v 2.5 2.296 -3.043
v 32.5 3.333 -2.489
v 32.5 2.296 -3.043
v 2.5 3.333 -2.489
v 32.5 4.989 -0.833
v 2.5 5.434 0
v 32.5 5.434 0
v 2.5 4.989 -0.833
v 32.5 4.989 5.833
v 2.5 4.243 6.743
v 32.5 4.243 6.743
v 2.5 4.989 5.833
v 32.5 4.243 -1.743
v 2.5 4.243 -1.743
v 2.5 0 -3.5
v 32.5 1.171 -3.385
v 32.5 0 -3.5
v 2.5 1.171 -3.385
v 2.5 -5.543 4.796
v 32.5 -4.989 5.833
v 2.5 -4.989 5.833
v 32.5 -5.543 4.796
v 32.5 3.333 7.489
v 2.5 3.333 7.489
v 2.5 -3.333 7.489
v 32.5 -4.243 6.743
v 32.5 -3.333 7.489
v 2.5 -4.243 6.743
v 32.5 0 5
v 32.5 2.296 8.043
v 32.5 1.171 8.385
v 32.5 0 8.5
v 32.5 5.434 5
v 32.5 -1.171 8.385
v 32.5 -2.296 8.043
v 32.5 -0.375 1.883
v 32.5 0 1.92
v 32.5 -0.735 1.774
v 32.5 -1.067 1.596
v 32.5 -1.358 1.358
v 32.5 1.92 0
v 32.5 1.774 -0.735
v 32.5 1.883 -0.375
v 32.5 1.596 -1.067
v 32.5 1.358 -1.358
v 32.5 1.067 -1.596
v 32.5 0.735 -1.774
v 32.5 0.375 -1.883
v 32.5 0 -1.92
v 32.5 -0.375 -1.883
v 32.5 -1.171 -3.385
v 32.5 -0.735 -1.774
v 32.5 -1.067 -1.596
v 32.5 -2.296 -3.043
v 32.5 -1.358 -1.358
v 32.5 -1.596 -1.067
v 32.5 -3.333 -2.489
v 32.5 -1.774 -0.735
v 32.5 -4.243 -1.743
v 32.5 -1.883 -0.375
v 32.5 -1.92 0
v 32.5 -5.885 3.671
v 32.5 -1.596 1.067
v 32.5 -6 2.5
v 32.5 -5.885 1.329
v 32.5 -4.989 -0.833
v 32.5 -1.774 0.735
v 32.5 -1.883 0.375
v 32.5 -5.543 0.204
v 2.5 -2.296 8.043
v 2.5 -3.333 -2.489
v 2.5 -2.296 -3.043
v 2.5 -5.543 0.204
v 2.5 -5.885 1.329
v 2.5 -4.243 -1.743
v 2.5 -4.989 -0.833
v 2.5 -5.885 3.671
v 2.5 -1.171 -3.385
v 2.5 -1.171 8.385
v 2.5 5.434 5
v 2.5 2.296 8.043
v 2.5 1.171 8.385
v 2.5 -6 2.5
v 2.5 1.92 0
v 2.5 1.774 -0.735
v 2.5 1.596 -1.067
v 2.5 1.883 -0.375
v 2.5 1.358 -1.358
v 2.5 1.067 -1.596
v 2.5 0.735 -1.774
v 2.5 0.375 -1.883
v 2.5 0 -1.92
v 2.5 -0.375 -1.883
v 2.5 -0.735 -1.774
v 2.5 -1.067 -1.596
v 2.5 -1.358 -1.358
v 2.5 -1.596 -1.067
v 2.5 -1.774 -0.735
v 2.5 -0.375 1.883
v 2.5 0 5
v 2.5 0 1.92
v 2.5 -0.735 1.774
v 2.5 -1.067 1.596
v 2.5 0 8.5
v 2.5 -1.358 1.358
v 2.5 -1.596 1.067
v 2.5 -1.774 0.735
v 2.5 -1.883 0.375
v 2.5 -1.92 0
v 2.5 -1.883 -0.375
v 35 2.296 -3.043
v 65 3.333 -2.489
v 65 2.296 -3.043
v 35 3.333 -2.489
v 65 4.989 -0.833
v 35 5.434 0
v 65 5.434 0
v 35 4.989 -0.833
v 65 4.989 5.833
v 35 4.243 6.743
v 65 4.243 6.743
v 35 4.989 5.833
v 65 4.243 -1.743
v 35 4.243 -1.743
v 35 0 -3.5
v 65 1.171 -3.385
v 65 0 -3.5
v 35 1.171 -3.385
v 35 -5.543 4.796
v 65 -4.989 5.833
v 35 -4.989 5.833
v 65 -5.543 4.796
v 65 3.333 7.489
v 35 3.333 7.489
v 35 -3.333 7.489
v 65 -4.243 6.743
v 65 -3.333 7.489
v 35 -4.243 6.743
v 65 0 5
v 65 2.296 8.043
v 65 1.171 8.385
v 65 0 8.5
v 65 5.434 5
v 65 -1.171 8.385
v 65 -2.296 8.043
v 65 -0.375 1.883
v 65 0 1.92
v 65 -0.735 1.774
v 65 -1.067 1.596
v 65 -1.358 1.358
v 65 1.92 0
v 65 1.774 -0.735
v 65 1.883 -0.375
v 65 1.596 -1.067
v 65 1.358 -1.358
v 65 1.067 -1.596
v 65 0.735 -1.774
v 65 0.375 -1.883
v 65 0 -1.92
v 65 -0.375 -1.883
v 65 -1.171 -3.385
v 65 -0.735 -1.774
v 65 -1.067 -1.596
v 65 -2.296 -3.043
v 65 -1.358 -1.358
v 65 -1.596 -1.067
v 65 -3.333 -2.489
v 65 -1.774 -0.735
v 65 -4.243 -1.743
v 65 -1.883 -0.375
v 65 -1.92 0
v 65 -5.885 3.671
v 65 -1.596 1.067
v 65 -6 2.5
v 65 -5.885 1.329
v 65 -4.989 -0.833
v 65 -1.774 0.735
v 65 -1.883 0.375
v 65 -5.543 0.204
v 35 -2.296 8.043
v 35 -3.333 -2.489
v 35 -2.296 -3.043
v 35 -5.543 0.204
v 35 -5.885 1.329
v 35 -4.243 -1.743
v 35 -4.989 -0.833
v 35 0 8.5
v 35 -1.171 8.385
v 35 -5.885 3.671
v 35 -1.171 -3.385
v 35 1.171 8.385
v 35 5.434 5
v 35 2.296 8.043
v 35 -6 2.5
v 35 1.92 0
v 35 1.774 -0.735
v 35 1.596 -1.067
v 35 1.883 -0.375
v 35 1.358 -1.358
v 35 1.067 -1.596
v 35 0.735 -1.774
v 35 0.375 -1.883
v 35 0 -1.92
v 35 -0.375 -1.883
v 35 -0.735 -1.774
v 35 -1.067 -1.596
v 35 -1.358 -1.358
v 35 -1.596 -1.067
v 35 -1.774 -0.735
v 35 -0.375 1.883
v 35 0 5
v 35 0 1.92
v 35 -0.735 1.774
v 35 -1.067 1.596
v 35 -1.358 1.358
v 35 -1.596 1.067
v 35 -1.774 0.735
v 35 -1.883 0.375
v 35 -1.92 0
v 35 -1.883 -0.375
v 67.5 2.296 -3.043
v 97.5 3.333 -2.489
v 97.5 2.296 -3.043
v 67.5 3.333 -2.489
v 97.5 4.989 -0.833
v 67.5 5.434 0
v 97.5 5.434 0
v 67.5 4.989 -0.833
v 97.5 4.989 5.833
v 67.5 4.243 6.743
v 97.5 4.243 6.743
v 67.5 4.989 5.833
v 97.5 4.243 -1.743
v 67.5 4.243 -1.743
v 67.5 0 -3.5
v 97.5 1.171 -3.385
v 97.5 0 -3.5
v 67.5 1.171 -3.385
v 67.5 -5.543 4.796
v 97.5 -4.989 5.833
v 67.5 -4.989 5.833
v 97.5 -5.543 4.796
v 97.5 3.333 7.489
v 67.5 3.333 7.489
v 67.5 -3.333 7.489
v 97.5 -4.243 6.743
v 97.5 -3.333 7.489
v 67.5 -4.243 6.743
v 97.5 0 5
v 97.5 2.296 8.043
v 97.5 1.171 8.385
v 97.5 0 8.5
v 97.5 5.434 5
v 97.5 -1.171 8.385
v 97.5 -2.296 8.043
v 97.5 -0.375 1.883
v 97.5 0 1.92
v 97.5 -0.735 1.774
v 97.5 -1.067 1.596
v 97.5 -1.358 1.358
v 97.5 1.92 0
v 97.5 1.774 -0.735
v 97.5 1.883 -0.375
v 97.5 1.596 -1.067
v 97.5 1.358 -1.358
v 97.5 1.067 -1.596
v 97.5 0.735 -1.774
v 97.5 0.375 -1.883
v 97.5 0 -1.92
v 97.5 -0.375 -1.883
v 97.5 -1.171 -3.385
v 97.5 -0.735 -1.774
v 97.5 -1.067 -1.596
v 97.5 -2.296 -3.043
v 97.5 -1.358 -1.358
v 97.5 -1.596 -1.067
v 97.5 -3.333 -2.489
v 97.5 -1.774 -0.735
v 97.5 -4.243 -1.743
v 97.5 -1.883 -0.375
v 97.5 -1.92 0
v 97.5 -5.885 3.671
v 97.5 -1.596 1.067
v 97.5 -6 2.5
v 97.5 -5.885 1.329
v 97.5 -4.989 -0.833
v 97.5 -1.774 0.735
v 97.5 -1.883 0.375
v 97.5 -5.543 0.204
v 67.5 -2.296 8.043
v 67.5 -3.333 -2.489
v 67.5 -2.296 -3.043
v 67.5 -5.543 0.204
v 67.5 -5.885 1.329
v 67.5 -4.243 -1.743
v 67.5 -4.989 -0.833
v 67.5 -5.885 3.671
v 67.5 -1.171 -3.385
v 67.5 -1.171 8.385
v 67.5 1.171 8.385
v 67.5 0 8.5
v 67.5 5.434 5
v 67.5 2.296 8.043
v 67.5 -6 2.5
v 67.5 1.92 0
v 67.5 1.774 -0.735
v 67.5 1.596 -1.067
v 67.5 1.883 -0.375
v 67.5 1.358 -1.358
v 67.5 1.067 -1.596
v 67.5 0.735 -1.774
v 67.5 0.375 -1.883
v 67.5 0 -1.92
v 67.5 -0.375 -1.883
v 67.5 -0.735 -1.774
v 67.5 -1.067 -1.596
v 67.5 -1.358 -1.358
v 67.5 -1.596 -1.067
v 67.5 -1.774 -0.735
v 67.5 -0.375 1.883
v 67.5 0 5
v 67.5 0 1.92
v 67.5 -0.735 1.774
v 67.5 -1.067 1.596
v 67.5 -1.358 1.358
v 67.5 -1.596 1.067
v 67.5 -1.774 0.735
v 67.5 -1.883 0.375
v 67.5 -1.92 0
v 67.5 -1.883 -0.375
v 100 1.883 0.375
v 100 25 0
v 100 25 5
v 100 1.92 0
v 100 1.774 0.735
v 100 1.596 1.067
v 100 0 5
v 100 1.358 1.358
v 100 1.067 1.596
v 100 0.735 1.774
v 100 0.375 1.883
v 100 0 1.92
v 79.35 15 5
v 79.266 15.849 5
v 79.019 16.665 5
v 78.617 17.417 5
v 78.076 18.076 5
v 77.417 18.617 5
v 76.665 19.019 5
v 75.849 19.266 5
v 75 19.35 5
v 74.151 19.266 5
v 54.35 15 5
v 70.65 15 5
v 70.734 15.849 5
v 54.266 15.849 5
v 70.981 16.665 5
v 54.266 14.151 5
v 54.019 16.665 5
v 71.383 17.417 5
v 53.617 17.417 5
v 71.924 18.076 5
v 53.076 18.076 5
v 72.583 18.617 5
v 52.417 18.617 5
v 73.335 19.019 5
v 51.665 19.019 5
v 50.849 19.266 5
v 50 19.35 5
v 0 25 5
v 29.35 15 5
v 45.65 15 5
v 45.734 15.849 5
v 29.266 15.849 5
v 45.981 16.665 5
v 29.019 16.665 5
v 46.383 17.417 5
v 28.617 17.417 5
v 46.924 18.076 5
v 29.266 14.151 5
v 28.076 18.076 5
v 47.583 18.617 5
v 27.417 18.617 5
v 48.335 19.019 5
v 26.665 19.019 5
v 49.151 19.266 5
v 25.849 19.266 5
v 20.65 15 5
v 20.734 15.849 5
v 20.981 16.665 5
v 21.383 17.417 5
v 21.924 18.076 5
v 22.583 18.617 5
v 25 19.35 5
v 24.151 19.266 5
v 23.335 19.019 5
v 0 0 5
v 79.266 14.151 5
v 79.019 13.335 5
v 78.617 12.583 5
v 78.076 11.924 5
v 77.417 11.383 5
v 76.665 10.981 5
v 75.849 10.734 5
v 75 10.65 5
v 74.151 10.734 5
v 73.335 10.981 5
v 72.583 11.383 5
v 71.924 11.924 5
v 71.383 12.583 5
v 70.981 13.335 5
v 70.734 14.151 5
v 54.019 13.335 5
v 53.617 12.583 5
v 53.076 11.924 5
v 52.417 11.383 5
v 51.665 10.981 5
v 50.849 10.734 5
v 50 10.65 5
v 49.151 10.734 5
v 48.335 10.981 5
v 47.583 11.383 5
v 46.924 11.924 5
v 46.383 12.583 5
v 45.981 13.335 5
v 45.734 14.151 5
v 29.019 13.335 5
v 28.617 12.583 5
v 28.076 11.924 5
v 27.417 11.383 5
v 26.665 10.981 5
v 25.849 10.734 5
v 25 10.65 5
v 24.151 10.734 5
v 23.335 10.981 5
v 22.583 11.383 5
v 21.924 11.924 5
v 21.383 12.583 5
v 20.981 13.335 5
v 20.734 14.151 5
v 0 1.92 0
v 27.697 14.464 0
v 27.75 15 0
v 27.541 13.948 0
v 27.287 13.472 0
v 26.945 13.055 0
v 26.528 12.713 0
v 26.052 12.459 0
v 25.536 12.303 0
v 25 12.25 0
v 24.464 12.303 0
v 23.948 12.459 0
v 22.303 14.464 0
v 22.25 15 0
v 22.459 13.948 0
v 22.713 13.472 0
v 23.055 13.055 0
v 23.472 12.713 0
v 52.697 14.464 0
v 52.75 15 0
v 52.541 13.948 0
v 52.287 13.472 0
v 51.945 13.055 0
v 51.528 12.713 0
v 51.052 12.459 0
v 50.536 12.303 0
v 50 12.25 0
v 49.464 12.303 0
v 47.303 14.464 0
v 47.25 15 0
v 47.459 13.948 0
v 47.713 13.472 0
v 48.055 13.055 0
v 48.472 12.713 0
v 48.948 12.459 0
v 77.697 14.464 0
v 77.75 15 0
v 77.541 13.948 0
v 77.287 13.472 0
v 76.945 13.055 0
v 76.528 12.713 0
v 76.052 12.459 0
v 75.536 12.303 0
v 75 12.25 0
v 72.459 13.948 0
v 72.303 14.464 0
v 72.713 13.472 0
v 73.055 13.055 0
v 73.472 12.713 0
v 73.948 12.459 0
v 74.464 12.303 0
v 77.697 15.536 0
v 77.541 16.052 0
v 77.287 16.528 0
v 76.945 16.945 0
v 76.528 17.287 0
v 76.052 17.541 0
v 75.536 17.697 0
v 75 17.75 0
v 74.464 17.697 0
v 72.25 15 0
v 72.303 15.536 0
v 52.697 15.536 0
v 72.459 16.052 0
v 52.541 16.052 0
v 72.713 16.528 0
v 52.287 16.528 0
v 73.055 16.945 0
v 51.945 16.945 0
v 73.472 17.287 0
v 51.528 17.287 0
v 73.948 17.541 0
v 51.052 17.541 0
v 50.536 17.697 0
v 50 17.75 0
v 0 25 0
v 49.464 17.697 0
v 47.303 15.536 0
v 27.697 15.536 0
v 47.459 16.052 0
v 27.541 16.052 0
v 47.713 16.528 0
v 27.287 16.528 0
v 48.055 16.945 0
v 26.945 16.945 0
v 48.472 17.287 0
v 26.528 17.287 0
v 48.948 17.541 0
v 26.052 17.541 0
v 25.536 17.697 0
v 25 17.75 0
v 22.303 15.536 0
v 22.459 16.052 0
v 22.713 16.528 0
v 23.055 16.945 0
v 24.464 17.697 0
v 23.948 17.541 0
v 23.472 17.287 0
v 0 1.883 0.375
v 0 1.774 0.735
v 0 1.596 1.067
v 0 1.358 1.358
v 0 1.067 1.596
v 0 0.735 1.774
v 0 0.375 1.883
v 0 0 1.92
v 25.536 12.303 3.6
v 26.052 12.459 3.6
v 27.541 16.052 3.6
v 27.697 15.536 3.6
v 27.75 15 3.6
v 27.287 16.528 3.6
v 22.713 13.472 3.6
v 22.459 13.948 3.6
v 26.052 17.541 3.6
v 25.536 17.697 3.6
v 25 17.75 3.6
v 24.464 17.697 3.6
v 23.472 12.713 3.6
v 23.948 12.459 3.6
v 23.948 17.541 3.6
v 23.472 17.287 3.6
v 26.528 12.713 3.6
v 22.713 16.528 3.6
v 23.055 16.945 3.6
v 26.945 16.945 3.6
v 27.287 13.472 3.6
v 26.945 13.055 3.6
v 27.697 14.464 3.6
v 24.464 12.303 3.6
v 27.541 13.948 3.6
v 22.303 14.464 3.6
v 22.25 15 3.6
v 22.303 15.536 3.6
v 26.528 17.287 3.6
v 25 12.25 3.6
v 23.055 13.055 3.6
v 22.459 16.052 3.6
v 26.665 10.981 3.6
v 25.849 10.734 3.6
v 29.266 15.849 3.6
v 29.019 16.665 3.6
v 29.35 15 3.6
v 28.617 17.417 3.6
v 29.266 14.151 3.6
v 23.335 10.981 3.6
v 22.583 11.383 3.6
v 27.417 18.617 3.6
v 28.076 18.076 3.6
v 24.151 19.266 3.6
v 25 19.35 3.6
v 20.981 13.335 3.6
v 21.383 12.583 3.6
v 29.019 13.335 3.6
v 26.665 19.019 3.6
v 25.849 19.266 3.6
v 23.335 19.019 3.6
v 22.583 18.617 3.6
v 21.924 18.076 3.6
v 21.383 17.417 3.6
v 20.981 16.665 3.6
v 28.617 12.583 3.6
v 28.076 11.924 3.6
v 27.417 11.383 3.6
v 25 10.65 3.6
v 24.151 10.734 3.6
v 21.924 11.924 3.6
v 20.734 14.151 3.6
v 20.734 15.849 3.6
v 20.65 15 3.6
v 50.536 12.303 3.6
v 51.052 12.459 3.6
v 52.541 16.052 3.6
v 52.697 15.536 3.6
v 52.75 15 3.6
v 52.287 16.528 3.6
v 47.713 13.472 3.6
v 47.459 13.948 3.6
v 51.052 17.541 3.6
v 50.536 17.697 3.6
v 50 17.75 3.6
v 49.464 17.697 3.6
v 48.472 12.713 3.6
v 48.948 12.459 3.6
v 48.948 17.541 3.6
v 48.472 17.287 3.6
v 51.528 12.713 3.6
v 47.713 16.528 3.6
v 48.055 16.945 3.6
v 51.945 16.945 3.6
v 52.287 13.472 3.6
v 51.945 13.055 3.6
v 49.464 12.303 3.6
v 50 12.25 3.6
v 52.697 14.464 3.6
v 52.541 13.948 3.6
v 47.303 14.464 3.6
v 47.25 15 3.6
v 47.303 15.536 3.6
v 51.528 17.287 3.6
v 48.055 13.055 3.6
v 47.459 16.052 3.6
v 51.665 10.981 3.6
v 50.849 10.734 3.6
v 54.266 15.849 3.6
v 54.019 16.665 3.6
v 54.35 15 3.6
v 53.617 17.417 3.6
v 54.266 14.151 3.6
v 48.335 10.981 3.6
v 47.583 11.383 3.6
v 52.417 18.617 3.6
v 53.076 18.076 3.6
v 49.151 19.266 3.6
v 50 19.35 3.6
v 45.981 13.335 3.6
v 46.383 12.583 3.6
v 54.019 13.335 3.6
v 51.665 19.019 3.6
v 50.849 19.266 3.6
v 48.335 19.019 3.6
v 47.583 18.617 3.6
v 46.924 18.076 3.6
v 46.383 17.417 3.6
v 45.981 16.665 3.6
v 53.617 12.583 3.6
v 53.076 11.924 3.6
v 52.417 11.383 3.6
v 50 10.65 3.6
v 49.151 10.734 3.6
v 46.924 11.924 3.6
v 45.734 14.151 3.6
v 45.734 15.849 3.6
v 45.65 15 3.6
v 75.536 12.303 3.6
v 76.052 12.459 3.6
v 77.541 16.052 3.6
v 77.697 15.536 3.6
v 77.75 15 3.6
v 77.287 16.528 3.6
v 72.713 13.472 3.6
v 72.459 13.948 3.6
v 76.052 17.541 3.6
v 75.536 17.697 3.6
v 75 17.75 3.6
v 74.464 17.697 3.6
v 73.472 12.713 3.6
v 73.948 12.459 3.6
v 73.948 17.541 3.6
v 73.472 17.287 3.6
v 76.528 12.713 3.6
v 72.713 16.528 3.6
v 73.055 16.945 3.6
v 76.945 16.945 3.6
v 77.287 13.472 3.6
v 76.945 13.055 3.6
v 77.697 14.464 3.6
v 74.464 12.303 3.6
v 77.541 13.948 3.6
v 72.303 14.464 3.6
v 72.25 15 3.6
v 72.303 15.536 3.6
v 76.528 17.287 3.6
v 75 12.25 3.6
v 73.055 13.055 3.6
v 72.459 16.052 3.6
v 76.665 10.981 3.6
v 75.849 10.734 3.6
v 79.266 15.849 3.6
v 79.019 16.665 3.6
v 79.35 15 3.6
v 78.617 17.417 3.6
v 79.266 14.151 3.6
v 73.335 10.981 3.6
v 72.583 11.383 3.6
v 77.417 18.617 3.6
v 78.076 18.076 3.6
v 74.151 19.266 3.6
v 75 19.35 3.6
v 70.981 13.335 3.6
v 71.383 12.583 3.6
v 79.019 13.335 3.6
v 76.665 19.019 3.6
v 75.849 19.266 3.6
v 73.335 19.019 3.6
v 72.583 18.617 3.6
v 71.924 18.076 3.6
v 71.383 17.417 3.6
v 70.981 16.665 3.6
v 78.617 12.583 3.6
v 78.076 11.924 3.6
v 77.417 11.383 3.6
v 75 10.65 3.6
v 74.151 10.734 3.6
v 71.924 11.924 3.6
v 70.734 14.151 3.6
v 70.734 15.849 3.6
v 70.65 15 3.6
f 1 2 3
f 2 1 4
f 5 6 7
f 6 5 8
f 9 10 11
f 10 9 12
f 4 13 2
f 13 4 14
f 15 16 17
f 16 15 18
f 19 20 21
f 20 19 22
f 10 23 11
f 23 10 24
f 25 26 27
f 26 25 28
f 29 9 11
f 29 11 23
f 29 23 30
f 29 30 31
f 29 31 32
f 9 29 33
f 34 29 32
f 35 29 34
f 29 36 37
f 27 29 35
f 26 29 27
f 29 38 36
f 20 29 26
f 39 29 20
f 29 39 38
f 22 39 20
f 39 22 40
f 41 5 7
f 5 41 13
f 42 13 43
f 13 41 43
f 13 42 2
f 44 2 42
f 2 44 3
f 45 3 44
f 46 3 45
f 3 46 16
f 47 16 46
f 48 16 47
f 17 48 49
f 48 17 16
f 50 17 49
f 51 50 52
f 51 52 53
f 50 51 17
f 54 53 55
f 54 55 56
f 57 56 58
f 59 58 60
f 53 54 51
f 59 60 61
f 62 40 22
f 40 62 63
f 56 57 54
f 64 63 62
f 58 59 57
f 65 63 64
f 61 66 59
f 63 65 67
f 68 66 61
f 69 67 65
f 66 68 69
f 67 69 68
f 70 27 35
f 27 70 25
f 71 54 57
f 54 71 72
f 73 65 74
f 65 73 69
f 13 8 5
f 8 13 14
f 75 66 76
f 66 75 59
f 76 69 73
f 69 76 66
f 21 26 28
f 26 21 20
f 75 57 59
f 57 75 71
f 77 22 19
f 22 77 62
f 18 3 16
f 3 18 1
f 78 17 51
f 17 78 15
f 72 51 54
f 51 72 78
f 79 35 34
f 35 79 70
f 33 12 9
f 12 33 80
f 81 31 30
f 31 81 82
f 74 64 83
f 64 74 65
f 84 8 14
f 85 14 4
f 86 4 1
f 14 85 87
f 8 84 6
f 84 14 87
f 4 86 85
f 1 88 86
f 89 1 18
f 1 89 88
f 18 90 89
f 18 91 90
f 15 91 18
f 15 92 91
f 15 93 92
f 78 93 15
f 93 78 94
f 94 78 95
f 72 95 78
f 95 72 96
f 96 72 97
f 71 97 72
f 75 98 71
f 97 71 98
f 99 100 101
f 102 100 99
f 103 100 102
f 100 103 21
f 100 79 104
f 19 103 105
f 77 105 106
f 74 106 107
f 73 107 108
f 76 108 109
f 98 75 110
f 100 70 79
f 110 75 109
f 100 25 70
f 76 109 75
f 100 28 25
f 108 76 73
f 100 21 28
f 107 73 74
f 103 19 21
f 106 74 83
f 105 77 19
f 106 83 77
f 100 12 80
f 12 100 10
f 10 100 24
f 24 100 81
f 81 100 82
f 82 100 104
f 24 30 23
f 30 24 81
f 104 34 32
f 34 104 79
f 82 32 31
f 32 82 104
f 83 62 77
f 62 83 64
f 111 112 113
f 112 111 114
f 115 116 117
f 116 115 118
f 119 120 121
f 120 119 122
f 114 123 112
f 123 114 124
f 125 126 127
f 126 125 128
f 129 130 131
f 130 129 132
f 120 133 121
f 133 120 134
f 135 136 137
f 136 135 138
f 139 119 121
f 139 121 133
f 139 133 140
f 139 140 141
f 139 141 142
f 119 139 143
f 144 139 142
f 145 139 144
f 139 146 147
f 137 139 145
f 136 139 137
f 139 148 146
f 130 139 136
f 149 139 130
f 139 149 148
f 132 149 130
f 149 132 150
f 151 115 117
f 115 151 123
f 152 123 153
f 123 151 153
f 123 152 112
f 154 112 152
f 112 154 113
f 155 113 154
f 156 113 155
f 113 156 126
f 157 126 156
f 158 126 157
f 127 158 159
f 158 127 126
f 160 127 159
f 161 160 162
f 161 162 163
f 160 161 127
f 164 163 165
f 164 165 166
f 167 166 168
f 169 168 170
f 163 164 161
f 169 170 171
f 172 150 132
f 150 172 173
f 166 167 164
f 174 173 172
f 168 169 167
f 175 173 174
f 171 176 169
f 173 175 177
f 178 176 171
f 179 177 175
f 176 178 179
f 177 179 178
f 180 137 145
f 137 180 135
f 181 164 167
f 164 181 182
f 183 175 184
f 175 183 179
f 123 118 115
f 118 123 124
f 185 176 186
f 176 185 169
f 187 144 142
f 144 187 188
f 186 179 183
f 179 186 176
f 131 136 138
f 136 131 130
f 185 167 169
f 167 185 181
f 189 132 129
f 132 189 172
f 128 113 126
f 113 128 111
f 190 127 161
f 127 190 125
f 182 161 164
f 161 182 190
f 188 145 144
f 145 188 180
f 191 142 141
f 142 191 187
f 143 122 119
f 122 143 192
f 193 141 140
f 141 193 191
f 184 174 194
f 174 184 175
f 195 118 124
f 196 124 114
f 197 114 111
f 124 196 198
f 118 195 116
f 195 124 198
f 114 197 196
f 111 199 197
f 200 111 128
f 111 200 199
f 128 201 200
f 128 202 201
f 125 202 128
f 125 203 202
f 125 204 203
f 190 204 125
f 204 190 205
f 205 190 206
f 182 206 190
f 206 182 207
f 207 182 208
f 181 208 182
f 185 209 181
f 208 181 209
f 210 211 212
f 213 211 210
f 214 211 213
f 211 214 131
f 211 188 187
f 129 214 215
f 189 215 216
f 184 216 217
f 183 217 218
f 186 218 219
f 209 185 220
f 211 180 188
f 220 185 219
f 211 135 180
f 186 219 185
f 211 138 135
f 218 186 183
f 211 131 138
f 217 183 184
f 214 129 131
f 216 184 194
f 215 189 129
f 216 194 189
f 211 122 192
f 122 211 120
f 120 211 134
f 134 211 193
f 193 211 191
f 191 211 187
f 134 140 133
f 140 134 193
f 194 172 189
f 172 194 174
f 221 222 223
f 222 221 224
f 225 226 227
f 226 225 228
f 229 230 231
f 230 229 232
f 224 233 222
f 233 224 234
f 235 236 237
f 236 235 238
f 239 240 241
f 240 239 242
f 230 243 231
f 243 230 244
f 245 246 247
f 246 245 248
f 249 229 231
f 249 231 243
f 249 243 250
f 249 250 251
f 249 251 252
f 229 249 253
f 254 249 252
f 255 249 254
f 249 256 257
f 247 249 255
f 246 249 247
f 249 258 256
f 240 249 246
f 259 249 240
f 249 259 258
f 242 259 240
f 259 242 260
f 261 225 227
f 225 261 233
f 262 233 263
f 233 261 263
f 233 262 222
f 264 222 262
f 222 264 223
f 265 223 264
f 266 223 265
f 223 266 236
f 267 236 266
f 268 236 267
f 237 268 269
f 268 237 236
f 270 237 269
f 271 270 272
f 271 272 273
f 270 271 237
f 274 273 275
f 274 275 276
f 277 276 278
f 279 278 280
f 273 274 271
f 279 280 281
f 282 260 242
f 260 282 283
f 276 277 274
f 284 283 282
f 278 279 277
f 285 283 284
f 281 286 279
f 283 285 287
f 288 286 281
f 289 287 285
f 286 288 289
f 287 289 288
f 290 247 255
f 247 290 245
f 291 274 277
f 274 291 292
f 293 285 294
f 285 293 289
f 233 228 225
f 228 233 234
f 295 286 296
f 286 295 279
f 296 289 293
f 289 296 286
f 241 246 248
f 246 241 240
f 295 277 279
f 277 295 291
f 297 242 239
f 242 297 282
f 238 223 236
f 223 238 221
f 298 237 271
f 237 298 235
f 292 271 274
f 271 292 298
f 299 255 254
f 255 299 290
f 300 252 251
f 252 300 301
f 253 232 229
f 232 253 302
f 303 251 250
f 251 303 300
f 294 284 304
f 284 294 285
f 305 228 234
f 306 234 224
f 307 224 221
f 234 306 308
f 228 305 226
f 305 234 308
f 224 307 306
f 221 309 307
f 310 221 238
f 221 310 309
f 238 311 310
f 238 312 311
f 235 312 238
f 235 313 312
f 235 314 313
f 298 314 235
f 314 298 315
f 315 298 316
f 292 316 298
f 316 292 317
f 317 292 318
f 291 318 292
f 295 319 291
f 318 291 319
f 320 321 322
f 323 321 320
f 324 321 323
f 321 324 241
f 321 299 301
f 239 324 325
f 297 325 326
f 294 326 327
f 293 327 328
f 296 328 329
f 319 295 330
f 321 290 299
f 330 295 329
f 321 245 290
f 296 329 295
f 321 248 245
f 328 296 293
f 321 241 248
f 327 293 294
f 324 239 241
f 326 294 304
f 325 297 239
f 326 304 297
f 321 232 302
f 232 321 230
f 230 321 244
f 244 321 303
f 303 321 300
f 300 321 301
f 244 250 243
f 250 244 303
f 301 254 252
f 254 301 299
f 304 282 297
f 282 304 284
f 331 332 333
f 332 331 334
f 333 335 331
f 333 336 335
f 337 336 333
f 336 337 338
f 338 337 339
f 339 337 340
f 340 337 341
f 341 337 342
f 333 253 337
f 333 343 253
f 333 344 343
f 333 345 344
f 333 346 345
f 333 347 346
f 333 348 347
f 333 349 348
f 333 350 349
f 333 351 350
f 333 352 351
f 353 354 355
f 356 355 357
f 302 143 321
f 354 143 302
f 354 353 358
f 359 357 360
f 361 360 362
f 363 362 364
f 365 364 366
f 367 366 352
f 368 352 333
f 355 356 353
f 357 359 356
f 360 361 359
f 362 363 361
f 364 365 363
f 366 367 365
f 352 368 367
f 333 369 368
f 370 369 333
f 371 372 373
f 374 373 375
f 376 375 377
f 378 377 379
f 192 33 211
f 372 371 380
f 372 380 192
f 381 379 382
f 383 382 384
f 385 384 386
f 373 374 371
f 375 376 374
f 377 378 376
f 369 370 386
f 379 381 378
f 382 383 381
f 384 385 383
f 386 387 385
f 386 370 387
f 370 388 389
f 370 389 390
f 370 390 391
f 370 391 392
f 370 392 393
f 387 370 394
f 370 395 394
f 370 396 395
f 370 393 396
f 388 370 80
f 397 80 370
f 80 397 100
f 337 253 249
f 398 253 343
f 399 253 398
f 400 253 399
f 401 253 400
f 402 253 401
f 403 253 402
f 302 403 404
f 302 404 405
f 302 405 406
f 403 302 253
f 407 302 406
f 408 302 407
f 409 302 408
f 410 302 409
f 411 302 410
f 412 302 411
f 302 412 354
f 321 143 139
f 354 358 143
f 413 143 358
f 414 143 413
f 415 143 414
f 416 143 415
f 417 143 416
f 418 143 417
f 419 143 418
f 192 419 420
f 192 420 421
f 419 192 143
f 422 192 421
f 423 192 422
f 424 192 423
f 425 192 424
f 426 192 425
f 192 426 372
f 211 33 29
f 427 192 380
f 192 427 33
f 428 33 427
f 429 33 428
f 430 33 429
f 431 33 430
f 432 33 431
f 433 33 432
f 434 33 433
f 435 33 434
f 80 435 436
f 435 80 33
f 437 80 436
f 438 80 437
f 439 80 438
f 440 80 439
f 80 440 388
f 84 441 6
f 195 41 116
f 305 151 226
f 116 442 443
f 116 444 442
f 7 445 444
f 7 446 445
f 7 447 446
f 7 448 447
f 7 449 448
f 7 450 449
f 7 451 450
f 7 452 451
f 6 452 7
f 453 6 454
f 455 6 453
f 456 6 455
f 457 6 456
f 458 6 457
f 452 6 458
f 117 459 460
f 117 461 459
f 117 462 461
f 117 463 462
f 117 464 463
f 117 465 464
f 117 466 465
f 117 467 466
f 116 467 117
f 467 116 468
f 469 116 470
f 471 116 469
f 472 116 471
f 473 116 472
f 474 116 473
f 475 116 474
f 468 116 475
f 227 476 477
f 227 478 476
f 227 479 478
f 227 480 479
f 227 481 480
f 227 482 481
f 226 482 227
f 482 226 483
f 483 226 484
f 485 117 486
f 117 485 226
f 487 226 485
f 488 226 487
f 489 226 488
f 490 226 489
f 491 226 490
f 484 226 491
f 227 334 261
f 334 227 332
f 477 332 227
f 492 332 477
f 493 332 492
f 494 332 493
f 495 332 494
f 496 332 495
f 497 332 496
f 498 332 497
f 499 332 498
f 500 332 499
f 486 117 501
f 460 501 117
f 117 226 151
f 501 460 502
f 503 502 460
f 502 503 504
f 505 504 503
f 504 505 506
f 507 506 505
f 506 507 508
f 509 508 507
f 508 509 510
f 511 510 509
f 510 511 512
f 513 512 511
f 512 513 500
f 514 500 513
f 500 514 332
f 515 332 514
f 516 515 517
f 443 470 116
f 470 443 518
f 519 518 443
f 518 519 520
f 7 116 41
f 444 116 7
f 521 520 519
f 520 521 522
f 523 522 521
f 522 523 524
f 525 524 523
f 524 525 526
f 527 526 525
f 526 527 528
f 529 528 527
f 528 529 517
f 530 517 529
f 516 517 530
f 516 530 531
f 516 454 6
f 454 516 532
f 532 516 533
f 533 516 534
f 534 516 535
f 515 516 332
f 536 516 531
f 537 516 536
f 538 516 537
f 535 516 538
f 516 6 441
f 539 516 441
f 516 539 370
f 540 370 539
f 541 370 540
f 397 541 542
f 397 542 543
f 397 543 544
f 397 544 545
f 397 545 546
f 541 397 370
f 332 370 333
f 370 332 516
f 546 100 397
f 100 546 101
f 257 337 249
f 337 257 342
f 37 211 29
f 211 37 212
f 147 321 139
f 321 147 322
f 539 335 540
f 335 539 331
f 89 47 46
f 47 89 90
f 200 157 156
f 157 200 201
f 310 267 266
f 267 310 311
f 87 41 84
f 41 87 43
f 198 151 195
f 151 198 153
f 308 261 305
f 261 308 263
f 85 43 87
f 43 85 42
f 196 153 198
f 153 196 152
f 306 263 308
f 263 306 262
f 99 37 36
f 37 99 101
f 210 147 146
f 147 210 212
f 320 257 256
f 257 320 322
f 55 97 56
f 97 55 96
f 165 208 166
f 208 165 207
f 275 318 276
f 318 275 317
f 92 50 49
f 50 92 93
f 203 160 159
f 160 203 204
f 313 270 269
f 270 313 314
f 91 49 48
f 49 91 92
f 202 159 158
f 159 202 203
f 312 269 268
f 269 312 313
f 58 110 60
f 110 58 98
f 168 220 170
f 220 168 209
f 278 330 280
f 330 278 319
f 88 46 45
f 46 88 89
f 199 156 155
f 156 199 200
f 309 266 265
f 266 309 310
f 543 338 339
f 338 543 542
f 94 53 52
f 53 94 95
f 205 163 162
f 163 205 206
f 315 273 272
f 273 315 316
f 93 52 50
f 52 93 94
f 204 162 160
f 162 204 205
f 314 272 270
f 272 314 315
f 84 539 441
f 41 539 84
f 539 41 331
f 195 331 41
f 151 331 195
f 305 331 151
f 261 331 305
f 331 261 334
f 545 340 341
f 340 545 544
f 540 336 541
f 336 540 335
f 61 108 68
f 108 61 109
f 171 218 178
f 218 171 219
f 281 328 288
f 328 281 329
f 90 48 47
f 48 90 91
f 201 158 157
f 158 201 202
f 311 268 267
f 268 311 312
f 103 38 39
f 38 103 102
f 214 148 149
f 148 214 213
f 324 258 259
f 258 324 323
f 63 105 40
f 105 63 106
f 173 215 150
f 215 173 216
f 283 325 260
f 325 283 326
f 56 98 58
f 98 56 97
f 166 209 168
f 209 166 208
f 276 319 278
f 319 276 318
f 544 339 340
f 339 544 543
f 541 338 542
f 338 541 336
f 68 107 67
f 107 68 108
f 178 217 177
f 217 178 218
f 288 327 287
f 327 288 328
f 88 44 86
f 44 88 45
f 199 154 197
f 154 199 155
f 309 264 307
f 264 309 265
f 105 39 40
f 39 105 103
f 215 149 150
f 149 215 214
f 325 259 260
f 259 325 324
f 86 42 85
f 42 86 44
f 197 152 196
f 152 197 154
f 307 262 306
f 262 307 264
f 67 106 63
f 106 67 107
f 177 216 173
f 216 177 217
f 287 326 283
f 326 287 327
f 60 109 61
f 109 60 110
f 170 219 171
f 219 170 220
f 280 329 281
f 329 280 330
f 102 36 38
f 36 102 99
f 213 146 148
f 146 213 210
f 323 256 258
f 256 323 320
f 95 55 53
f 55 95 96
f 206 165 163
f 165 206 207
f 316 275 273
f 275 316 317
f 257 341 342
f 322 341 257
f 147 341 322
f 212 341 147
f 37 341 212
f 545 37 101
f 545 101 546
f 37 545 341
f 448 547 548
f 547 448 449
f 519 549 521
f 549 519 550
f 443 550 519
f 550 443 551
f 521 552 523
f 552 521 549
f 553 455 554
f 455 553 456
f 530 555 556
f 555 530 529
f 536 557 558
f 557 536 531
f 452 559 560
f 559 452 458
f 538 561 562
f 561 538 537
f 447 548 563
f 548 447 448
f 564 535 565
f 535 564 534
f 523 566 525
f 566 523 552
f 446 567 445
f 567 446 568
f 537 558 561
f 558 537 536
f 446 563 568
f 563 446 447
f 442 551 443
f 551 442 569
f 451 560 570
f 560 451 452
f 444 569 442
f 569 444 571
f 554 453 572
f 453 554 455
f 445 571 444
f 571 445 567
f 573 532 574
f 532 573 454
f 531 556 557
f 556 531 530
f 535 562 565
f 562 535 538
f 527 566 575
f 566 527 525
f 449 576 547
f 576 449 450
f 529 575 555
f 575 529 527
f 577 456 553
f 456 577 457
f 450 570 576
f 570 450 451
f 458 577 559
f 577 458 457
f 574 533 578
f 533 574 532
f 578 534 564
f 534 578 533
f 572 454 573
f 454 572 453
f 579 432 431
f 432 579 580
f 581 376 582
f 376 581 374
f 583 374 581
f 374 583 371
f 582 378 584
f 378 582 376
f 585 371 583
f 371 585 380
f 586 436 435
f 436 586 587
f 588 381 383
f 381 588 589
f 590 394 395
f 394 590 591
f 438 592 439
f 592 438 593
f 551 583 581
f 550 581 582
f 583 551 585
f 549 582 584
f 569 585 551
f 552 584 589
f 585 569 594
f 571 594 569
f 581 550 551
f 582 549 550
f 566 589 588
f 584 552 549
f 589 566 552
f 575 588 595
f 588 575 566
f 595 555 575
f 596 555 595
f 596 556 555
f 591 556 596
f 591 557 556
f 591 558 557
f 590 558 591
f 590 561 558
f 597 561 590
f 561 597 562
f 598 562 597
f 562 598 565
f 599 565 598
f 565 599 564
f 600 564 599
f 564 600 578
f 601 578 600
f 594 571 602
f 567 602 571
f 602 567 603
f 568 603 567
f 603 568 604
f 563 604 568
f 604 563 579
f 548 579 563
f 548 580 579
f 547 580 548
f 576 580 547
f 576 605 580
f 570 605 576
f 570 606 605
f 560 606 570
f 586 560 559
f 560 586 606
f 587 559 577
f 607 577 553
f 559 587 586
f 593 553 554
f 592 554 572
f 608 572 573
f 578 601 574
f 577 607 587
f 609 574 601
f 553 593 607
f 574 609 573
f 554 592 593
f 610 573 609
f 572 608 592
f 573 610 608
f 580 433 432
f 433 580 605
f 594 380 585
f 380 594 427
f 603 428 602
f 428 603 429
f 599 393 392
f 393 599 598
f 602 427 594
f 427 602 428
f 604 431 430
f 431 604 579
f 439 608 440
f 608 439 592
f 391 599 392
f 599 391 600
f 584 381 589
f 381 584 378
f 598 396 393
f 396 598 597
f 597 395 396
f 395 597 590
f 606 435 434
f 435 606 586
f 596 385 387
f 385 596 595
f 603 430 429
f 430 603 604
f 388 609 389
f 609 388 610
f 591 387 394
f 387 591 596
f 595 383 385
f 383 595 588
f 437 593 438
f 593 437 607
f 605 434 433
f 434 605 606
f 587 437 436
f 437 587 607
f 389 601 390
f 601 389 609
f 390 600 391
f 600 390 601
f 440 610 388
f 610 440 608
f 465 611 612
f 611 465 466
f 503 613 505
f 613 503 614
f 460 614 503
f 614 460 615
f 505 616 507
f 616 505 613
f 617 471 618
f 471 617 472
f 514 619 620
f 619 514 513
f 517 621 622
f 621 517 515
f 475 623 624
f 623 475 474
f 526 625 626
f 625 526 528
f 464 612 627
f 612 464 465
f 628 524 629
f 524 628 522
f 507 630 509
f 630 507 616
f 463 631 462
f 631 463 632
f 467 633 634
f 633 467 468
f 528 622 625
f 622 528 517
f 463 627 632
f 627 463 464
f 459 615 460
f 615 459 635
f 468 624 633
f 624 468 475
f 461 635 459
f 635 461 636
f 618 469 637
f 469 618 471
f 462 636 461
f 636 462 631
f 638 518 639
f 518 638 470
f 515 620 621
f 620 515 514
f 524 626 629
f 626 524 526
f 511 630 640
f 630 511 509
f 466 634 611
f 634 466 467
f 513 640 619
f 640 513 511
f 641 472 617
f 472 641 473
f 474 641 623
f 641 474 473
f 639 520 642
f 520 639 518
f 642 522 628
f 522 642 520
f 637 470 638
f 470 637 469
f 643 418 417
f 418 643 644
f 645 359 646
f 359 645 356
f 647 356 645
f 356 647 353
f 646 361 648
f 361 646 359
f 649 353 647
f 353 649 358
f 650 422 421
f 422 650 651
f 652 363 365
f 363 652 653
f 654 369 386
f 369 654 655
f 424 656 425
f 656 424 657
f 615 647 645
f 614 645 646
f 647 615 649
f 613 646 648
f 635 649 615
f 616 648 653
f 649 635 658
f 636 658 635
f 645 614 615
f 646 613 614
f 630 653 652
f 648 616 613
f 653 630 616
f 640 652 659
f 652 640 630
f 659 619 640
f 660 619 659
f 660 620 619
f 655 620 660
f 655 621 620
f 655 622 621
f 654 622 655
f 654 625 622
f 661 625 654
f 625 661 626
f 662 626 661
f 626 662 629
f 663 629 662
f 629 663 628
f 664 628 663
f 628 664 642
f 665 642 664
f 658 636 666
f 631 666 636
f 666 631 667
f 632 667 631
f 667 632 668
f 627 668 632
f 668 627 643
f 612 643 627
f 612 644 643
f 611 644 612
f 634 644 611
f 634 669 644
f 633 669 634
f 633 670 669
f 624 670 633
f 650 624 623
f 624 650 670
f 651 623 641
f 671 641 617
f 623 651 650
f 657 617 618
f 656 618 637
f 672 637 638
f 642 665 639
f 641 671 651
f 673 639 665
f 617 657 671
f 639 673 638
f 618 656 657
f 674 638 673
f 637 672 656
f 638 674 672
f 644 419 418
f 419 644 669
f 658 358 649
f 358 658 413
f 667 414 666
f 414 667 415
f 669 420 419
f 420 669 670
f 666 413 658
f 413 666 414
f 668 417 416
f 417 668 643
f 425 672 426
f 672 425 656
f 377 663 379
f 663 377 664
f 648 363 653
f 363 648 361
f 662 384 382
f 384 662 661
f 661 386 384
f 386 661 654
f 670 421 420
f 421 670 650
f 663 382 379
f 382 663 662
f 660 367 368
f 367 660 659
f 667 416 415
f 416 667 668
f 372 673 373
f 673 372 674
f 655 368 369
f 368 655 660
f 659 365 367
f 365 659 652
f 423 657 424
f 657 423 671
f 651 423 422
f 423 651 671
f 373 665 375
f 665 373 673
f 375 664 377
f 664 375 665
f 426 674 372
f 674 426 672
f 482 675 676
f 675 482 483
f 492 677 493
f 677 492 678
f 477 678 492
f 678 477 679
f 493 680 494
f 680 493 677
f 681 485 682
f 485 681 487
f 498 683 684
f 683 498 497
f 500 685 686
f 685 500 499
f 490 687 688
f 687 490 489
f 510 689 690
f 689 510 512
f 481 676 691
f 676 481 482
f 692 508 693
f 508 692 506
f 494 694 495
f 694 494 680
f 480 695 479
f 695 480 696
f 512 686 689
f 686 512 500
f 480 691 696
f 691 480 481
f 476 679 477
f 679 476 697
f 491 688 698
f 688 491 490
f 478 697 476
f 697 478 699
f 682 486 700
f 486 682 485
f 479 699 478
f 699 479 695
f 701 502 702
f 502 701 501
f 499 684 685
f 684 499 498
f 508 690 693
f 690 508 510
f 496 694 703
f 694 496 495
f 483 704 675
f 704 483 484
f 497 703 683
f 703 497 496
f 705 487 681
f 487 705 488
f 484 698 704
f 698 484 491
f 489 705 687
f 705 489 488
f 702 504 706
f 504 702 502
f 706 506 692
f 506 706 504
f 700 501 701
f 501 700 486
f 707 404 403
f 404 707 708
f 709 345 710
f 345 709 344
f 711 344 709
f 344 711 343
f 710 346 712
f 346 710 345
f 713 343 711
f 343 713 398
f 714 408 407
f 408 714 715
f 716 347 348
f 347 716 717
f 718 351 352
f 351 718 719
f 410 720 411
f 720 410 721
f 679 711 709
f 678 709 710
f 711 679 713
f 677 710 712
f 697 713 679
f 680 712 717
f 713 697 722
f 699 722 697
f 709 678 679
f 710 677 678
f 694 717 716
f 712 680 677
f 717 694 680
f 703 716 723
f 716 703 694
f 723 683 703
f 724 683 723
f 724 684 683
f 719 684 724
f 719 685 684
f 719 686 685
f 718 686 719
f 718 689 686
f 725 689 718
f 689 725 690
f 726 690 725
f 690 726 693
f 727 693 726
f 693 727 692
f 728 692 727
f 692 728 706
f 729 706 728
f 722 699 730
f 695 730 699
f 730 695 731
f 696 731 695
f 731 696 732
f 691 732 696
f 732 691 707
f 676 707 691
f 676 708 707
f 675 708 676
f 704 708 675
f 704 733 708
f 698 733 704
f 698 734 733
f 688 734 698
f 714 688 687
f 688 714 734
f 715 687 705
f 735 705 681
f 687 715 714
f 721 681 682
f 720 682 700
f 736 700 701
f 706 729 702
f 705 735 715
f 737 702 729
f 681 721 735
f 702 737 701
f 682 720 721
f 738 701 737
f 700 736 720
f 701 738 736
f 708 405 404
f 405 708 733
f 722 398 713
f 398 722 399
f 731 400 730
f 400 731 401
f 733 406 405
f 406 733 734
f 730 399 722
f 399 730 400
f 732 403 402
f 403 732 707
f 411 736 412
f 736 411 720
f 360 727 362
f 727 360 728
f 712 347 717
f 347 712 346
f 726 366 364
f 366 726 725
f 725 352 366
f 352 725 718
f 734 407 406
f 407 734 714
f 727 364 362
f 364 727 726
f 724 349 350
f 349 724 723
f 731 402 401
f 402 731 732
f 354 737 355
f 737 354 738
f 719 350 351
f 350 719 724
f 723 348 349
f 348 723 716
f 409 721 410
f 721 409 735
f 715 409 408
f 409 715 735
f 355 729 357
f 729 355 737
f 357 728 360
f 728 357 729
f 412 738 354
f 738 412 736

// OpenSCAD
$fn = 32;

// ----------------------------------------------------------------------
// Hinge leaf: 100 x 31 x 12 mm
// ----------------------------------------------------------------------

// --- parameters (mm) ---
plate_len = 100;          // leaf length, X
plate_w = 25;             // leaf width, Y
plate_t = 5;              // leaf thickness
barrel_d = 12;            // knuckle diameter
barrel_w = 30;            // knuckle width
knuckle_n = 3;            // number of knuckles
pin_d = 3.84;             // pin bore
gap = 2.5;                // gap between the knuckles
screw_d = 5.5;            // screw clearance
cs_d = 8.7;               // countersink diameter
cs_h = 1.4;               // countersink depth

module leaf() {
  cube([plate_len, plate_w, plate_t]);
}

module knuckles() {
  /* barrels sit on the leaf edge, the pin axis at half the leaf thickness */
  for (i = [0 : knuckle_n - 1])
    translate([gap + i * (barrel_w + gap), 0, plate_t * 0.5])
      rotate([0, 90, 0]) cylinder(h = barrel_w, d = barrel_d);
}

difference() {
  union() {
    leaf();
    knuckles();
  }
  rotate([0, 90, 0]) translate([0, 0, -1])
    cylinder(h = plate_len + 2, d = pin_d);
  translate([25, plate_w * 0.6, -1]) cylinder(h = plate_t + 2, d = screw_d);
  translate([25, plate_w * 0.6, plate_t - cs_h]) cylinder(h = cs_h + 0.5, d = cs_d);
  translate([50, plate_w * 0.6, -1]) cylinder(h = plate_t + 2, d = screw_d);
  translate([50, plate_w * 0.6, plate_t - cs_h]) cylinder(h = cs_h + 0.5, d = cs_d);
  translate([75, plate_w * 0.6, -1]) cylinder(h = plate_t + 2, d = screw_d);
  translate([75, plate_w * 0.6, plate_t - cs_h]) cylinder(h = cs_h + 0.5, d = cs_d);
}
